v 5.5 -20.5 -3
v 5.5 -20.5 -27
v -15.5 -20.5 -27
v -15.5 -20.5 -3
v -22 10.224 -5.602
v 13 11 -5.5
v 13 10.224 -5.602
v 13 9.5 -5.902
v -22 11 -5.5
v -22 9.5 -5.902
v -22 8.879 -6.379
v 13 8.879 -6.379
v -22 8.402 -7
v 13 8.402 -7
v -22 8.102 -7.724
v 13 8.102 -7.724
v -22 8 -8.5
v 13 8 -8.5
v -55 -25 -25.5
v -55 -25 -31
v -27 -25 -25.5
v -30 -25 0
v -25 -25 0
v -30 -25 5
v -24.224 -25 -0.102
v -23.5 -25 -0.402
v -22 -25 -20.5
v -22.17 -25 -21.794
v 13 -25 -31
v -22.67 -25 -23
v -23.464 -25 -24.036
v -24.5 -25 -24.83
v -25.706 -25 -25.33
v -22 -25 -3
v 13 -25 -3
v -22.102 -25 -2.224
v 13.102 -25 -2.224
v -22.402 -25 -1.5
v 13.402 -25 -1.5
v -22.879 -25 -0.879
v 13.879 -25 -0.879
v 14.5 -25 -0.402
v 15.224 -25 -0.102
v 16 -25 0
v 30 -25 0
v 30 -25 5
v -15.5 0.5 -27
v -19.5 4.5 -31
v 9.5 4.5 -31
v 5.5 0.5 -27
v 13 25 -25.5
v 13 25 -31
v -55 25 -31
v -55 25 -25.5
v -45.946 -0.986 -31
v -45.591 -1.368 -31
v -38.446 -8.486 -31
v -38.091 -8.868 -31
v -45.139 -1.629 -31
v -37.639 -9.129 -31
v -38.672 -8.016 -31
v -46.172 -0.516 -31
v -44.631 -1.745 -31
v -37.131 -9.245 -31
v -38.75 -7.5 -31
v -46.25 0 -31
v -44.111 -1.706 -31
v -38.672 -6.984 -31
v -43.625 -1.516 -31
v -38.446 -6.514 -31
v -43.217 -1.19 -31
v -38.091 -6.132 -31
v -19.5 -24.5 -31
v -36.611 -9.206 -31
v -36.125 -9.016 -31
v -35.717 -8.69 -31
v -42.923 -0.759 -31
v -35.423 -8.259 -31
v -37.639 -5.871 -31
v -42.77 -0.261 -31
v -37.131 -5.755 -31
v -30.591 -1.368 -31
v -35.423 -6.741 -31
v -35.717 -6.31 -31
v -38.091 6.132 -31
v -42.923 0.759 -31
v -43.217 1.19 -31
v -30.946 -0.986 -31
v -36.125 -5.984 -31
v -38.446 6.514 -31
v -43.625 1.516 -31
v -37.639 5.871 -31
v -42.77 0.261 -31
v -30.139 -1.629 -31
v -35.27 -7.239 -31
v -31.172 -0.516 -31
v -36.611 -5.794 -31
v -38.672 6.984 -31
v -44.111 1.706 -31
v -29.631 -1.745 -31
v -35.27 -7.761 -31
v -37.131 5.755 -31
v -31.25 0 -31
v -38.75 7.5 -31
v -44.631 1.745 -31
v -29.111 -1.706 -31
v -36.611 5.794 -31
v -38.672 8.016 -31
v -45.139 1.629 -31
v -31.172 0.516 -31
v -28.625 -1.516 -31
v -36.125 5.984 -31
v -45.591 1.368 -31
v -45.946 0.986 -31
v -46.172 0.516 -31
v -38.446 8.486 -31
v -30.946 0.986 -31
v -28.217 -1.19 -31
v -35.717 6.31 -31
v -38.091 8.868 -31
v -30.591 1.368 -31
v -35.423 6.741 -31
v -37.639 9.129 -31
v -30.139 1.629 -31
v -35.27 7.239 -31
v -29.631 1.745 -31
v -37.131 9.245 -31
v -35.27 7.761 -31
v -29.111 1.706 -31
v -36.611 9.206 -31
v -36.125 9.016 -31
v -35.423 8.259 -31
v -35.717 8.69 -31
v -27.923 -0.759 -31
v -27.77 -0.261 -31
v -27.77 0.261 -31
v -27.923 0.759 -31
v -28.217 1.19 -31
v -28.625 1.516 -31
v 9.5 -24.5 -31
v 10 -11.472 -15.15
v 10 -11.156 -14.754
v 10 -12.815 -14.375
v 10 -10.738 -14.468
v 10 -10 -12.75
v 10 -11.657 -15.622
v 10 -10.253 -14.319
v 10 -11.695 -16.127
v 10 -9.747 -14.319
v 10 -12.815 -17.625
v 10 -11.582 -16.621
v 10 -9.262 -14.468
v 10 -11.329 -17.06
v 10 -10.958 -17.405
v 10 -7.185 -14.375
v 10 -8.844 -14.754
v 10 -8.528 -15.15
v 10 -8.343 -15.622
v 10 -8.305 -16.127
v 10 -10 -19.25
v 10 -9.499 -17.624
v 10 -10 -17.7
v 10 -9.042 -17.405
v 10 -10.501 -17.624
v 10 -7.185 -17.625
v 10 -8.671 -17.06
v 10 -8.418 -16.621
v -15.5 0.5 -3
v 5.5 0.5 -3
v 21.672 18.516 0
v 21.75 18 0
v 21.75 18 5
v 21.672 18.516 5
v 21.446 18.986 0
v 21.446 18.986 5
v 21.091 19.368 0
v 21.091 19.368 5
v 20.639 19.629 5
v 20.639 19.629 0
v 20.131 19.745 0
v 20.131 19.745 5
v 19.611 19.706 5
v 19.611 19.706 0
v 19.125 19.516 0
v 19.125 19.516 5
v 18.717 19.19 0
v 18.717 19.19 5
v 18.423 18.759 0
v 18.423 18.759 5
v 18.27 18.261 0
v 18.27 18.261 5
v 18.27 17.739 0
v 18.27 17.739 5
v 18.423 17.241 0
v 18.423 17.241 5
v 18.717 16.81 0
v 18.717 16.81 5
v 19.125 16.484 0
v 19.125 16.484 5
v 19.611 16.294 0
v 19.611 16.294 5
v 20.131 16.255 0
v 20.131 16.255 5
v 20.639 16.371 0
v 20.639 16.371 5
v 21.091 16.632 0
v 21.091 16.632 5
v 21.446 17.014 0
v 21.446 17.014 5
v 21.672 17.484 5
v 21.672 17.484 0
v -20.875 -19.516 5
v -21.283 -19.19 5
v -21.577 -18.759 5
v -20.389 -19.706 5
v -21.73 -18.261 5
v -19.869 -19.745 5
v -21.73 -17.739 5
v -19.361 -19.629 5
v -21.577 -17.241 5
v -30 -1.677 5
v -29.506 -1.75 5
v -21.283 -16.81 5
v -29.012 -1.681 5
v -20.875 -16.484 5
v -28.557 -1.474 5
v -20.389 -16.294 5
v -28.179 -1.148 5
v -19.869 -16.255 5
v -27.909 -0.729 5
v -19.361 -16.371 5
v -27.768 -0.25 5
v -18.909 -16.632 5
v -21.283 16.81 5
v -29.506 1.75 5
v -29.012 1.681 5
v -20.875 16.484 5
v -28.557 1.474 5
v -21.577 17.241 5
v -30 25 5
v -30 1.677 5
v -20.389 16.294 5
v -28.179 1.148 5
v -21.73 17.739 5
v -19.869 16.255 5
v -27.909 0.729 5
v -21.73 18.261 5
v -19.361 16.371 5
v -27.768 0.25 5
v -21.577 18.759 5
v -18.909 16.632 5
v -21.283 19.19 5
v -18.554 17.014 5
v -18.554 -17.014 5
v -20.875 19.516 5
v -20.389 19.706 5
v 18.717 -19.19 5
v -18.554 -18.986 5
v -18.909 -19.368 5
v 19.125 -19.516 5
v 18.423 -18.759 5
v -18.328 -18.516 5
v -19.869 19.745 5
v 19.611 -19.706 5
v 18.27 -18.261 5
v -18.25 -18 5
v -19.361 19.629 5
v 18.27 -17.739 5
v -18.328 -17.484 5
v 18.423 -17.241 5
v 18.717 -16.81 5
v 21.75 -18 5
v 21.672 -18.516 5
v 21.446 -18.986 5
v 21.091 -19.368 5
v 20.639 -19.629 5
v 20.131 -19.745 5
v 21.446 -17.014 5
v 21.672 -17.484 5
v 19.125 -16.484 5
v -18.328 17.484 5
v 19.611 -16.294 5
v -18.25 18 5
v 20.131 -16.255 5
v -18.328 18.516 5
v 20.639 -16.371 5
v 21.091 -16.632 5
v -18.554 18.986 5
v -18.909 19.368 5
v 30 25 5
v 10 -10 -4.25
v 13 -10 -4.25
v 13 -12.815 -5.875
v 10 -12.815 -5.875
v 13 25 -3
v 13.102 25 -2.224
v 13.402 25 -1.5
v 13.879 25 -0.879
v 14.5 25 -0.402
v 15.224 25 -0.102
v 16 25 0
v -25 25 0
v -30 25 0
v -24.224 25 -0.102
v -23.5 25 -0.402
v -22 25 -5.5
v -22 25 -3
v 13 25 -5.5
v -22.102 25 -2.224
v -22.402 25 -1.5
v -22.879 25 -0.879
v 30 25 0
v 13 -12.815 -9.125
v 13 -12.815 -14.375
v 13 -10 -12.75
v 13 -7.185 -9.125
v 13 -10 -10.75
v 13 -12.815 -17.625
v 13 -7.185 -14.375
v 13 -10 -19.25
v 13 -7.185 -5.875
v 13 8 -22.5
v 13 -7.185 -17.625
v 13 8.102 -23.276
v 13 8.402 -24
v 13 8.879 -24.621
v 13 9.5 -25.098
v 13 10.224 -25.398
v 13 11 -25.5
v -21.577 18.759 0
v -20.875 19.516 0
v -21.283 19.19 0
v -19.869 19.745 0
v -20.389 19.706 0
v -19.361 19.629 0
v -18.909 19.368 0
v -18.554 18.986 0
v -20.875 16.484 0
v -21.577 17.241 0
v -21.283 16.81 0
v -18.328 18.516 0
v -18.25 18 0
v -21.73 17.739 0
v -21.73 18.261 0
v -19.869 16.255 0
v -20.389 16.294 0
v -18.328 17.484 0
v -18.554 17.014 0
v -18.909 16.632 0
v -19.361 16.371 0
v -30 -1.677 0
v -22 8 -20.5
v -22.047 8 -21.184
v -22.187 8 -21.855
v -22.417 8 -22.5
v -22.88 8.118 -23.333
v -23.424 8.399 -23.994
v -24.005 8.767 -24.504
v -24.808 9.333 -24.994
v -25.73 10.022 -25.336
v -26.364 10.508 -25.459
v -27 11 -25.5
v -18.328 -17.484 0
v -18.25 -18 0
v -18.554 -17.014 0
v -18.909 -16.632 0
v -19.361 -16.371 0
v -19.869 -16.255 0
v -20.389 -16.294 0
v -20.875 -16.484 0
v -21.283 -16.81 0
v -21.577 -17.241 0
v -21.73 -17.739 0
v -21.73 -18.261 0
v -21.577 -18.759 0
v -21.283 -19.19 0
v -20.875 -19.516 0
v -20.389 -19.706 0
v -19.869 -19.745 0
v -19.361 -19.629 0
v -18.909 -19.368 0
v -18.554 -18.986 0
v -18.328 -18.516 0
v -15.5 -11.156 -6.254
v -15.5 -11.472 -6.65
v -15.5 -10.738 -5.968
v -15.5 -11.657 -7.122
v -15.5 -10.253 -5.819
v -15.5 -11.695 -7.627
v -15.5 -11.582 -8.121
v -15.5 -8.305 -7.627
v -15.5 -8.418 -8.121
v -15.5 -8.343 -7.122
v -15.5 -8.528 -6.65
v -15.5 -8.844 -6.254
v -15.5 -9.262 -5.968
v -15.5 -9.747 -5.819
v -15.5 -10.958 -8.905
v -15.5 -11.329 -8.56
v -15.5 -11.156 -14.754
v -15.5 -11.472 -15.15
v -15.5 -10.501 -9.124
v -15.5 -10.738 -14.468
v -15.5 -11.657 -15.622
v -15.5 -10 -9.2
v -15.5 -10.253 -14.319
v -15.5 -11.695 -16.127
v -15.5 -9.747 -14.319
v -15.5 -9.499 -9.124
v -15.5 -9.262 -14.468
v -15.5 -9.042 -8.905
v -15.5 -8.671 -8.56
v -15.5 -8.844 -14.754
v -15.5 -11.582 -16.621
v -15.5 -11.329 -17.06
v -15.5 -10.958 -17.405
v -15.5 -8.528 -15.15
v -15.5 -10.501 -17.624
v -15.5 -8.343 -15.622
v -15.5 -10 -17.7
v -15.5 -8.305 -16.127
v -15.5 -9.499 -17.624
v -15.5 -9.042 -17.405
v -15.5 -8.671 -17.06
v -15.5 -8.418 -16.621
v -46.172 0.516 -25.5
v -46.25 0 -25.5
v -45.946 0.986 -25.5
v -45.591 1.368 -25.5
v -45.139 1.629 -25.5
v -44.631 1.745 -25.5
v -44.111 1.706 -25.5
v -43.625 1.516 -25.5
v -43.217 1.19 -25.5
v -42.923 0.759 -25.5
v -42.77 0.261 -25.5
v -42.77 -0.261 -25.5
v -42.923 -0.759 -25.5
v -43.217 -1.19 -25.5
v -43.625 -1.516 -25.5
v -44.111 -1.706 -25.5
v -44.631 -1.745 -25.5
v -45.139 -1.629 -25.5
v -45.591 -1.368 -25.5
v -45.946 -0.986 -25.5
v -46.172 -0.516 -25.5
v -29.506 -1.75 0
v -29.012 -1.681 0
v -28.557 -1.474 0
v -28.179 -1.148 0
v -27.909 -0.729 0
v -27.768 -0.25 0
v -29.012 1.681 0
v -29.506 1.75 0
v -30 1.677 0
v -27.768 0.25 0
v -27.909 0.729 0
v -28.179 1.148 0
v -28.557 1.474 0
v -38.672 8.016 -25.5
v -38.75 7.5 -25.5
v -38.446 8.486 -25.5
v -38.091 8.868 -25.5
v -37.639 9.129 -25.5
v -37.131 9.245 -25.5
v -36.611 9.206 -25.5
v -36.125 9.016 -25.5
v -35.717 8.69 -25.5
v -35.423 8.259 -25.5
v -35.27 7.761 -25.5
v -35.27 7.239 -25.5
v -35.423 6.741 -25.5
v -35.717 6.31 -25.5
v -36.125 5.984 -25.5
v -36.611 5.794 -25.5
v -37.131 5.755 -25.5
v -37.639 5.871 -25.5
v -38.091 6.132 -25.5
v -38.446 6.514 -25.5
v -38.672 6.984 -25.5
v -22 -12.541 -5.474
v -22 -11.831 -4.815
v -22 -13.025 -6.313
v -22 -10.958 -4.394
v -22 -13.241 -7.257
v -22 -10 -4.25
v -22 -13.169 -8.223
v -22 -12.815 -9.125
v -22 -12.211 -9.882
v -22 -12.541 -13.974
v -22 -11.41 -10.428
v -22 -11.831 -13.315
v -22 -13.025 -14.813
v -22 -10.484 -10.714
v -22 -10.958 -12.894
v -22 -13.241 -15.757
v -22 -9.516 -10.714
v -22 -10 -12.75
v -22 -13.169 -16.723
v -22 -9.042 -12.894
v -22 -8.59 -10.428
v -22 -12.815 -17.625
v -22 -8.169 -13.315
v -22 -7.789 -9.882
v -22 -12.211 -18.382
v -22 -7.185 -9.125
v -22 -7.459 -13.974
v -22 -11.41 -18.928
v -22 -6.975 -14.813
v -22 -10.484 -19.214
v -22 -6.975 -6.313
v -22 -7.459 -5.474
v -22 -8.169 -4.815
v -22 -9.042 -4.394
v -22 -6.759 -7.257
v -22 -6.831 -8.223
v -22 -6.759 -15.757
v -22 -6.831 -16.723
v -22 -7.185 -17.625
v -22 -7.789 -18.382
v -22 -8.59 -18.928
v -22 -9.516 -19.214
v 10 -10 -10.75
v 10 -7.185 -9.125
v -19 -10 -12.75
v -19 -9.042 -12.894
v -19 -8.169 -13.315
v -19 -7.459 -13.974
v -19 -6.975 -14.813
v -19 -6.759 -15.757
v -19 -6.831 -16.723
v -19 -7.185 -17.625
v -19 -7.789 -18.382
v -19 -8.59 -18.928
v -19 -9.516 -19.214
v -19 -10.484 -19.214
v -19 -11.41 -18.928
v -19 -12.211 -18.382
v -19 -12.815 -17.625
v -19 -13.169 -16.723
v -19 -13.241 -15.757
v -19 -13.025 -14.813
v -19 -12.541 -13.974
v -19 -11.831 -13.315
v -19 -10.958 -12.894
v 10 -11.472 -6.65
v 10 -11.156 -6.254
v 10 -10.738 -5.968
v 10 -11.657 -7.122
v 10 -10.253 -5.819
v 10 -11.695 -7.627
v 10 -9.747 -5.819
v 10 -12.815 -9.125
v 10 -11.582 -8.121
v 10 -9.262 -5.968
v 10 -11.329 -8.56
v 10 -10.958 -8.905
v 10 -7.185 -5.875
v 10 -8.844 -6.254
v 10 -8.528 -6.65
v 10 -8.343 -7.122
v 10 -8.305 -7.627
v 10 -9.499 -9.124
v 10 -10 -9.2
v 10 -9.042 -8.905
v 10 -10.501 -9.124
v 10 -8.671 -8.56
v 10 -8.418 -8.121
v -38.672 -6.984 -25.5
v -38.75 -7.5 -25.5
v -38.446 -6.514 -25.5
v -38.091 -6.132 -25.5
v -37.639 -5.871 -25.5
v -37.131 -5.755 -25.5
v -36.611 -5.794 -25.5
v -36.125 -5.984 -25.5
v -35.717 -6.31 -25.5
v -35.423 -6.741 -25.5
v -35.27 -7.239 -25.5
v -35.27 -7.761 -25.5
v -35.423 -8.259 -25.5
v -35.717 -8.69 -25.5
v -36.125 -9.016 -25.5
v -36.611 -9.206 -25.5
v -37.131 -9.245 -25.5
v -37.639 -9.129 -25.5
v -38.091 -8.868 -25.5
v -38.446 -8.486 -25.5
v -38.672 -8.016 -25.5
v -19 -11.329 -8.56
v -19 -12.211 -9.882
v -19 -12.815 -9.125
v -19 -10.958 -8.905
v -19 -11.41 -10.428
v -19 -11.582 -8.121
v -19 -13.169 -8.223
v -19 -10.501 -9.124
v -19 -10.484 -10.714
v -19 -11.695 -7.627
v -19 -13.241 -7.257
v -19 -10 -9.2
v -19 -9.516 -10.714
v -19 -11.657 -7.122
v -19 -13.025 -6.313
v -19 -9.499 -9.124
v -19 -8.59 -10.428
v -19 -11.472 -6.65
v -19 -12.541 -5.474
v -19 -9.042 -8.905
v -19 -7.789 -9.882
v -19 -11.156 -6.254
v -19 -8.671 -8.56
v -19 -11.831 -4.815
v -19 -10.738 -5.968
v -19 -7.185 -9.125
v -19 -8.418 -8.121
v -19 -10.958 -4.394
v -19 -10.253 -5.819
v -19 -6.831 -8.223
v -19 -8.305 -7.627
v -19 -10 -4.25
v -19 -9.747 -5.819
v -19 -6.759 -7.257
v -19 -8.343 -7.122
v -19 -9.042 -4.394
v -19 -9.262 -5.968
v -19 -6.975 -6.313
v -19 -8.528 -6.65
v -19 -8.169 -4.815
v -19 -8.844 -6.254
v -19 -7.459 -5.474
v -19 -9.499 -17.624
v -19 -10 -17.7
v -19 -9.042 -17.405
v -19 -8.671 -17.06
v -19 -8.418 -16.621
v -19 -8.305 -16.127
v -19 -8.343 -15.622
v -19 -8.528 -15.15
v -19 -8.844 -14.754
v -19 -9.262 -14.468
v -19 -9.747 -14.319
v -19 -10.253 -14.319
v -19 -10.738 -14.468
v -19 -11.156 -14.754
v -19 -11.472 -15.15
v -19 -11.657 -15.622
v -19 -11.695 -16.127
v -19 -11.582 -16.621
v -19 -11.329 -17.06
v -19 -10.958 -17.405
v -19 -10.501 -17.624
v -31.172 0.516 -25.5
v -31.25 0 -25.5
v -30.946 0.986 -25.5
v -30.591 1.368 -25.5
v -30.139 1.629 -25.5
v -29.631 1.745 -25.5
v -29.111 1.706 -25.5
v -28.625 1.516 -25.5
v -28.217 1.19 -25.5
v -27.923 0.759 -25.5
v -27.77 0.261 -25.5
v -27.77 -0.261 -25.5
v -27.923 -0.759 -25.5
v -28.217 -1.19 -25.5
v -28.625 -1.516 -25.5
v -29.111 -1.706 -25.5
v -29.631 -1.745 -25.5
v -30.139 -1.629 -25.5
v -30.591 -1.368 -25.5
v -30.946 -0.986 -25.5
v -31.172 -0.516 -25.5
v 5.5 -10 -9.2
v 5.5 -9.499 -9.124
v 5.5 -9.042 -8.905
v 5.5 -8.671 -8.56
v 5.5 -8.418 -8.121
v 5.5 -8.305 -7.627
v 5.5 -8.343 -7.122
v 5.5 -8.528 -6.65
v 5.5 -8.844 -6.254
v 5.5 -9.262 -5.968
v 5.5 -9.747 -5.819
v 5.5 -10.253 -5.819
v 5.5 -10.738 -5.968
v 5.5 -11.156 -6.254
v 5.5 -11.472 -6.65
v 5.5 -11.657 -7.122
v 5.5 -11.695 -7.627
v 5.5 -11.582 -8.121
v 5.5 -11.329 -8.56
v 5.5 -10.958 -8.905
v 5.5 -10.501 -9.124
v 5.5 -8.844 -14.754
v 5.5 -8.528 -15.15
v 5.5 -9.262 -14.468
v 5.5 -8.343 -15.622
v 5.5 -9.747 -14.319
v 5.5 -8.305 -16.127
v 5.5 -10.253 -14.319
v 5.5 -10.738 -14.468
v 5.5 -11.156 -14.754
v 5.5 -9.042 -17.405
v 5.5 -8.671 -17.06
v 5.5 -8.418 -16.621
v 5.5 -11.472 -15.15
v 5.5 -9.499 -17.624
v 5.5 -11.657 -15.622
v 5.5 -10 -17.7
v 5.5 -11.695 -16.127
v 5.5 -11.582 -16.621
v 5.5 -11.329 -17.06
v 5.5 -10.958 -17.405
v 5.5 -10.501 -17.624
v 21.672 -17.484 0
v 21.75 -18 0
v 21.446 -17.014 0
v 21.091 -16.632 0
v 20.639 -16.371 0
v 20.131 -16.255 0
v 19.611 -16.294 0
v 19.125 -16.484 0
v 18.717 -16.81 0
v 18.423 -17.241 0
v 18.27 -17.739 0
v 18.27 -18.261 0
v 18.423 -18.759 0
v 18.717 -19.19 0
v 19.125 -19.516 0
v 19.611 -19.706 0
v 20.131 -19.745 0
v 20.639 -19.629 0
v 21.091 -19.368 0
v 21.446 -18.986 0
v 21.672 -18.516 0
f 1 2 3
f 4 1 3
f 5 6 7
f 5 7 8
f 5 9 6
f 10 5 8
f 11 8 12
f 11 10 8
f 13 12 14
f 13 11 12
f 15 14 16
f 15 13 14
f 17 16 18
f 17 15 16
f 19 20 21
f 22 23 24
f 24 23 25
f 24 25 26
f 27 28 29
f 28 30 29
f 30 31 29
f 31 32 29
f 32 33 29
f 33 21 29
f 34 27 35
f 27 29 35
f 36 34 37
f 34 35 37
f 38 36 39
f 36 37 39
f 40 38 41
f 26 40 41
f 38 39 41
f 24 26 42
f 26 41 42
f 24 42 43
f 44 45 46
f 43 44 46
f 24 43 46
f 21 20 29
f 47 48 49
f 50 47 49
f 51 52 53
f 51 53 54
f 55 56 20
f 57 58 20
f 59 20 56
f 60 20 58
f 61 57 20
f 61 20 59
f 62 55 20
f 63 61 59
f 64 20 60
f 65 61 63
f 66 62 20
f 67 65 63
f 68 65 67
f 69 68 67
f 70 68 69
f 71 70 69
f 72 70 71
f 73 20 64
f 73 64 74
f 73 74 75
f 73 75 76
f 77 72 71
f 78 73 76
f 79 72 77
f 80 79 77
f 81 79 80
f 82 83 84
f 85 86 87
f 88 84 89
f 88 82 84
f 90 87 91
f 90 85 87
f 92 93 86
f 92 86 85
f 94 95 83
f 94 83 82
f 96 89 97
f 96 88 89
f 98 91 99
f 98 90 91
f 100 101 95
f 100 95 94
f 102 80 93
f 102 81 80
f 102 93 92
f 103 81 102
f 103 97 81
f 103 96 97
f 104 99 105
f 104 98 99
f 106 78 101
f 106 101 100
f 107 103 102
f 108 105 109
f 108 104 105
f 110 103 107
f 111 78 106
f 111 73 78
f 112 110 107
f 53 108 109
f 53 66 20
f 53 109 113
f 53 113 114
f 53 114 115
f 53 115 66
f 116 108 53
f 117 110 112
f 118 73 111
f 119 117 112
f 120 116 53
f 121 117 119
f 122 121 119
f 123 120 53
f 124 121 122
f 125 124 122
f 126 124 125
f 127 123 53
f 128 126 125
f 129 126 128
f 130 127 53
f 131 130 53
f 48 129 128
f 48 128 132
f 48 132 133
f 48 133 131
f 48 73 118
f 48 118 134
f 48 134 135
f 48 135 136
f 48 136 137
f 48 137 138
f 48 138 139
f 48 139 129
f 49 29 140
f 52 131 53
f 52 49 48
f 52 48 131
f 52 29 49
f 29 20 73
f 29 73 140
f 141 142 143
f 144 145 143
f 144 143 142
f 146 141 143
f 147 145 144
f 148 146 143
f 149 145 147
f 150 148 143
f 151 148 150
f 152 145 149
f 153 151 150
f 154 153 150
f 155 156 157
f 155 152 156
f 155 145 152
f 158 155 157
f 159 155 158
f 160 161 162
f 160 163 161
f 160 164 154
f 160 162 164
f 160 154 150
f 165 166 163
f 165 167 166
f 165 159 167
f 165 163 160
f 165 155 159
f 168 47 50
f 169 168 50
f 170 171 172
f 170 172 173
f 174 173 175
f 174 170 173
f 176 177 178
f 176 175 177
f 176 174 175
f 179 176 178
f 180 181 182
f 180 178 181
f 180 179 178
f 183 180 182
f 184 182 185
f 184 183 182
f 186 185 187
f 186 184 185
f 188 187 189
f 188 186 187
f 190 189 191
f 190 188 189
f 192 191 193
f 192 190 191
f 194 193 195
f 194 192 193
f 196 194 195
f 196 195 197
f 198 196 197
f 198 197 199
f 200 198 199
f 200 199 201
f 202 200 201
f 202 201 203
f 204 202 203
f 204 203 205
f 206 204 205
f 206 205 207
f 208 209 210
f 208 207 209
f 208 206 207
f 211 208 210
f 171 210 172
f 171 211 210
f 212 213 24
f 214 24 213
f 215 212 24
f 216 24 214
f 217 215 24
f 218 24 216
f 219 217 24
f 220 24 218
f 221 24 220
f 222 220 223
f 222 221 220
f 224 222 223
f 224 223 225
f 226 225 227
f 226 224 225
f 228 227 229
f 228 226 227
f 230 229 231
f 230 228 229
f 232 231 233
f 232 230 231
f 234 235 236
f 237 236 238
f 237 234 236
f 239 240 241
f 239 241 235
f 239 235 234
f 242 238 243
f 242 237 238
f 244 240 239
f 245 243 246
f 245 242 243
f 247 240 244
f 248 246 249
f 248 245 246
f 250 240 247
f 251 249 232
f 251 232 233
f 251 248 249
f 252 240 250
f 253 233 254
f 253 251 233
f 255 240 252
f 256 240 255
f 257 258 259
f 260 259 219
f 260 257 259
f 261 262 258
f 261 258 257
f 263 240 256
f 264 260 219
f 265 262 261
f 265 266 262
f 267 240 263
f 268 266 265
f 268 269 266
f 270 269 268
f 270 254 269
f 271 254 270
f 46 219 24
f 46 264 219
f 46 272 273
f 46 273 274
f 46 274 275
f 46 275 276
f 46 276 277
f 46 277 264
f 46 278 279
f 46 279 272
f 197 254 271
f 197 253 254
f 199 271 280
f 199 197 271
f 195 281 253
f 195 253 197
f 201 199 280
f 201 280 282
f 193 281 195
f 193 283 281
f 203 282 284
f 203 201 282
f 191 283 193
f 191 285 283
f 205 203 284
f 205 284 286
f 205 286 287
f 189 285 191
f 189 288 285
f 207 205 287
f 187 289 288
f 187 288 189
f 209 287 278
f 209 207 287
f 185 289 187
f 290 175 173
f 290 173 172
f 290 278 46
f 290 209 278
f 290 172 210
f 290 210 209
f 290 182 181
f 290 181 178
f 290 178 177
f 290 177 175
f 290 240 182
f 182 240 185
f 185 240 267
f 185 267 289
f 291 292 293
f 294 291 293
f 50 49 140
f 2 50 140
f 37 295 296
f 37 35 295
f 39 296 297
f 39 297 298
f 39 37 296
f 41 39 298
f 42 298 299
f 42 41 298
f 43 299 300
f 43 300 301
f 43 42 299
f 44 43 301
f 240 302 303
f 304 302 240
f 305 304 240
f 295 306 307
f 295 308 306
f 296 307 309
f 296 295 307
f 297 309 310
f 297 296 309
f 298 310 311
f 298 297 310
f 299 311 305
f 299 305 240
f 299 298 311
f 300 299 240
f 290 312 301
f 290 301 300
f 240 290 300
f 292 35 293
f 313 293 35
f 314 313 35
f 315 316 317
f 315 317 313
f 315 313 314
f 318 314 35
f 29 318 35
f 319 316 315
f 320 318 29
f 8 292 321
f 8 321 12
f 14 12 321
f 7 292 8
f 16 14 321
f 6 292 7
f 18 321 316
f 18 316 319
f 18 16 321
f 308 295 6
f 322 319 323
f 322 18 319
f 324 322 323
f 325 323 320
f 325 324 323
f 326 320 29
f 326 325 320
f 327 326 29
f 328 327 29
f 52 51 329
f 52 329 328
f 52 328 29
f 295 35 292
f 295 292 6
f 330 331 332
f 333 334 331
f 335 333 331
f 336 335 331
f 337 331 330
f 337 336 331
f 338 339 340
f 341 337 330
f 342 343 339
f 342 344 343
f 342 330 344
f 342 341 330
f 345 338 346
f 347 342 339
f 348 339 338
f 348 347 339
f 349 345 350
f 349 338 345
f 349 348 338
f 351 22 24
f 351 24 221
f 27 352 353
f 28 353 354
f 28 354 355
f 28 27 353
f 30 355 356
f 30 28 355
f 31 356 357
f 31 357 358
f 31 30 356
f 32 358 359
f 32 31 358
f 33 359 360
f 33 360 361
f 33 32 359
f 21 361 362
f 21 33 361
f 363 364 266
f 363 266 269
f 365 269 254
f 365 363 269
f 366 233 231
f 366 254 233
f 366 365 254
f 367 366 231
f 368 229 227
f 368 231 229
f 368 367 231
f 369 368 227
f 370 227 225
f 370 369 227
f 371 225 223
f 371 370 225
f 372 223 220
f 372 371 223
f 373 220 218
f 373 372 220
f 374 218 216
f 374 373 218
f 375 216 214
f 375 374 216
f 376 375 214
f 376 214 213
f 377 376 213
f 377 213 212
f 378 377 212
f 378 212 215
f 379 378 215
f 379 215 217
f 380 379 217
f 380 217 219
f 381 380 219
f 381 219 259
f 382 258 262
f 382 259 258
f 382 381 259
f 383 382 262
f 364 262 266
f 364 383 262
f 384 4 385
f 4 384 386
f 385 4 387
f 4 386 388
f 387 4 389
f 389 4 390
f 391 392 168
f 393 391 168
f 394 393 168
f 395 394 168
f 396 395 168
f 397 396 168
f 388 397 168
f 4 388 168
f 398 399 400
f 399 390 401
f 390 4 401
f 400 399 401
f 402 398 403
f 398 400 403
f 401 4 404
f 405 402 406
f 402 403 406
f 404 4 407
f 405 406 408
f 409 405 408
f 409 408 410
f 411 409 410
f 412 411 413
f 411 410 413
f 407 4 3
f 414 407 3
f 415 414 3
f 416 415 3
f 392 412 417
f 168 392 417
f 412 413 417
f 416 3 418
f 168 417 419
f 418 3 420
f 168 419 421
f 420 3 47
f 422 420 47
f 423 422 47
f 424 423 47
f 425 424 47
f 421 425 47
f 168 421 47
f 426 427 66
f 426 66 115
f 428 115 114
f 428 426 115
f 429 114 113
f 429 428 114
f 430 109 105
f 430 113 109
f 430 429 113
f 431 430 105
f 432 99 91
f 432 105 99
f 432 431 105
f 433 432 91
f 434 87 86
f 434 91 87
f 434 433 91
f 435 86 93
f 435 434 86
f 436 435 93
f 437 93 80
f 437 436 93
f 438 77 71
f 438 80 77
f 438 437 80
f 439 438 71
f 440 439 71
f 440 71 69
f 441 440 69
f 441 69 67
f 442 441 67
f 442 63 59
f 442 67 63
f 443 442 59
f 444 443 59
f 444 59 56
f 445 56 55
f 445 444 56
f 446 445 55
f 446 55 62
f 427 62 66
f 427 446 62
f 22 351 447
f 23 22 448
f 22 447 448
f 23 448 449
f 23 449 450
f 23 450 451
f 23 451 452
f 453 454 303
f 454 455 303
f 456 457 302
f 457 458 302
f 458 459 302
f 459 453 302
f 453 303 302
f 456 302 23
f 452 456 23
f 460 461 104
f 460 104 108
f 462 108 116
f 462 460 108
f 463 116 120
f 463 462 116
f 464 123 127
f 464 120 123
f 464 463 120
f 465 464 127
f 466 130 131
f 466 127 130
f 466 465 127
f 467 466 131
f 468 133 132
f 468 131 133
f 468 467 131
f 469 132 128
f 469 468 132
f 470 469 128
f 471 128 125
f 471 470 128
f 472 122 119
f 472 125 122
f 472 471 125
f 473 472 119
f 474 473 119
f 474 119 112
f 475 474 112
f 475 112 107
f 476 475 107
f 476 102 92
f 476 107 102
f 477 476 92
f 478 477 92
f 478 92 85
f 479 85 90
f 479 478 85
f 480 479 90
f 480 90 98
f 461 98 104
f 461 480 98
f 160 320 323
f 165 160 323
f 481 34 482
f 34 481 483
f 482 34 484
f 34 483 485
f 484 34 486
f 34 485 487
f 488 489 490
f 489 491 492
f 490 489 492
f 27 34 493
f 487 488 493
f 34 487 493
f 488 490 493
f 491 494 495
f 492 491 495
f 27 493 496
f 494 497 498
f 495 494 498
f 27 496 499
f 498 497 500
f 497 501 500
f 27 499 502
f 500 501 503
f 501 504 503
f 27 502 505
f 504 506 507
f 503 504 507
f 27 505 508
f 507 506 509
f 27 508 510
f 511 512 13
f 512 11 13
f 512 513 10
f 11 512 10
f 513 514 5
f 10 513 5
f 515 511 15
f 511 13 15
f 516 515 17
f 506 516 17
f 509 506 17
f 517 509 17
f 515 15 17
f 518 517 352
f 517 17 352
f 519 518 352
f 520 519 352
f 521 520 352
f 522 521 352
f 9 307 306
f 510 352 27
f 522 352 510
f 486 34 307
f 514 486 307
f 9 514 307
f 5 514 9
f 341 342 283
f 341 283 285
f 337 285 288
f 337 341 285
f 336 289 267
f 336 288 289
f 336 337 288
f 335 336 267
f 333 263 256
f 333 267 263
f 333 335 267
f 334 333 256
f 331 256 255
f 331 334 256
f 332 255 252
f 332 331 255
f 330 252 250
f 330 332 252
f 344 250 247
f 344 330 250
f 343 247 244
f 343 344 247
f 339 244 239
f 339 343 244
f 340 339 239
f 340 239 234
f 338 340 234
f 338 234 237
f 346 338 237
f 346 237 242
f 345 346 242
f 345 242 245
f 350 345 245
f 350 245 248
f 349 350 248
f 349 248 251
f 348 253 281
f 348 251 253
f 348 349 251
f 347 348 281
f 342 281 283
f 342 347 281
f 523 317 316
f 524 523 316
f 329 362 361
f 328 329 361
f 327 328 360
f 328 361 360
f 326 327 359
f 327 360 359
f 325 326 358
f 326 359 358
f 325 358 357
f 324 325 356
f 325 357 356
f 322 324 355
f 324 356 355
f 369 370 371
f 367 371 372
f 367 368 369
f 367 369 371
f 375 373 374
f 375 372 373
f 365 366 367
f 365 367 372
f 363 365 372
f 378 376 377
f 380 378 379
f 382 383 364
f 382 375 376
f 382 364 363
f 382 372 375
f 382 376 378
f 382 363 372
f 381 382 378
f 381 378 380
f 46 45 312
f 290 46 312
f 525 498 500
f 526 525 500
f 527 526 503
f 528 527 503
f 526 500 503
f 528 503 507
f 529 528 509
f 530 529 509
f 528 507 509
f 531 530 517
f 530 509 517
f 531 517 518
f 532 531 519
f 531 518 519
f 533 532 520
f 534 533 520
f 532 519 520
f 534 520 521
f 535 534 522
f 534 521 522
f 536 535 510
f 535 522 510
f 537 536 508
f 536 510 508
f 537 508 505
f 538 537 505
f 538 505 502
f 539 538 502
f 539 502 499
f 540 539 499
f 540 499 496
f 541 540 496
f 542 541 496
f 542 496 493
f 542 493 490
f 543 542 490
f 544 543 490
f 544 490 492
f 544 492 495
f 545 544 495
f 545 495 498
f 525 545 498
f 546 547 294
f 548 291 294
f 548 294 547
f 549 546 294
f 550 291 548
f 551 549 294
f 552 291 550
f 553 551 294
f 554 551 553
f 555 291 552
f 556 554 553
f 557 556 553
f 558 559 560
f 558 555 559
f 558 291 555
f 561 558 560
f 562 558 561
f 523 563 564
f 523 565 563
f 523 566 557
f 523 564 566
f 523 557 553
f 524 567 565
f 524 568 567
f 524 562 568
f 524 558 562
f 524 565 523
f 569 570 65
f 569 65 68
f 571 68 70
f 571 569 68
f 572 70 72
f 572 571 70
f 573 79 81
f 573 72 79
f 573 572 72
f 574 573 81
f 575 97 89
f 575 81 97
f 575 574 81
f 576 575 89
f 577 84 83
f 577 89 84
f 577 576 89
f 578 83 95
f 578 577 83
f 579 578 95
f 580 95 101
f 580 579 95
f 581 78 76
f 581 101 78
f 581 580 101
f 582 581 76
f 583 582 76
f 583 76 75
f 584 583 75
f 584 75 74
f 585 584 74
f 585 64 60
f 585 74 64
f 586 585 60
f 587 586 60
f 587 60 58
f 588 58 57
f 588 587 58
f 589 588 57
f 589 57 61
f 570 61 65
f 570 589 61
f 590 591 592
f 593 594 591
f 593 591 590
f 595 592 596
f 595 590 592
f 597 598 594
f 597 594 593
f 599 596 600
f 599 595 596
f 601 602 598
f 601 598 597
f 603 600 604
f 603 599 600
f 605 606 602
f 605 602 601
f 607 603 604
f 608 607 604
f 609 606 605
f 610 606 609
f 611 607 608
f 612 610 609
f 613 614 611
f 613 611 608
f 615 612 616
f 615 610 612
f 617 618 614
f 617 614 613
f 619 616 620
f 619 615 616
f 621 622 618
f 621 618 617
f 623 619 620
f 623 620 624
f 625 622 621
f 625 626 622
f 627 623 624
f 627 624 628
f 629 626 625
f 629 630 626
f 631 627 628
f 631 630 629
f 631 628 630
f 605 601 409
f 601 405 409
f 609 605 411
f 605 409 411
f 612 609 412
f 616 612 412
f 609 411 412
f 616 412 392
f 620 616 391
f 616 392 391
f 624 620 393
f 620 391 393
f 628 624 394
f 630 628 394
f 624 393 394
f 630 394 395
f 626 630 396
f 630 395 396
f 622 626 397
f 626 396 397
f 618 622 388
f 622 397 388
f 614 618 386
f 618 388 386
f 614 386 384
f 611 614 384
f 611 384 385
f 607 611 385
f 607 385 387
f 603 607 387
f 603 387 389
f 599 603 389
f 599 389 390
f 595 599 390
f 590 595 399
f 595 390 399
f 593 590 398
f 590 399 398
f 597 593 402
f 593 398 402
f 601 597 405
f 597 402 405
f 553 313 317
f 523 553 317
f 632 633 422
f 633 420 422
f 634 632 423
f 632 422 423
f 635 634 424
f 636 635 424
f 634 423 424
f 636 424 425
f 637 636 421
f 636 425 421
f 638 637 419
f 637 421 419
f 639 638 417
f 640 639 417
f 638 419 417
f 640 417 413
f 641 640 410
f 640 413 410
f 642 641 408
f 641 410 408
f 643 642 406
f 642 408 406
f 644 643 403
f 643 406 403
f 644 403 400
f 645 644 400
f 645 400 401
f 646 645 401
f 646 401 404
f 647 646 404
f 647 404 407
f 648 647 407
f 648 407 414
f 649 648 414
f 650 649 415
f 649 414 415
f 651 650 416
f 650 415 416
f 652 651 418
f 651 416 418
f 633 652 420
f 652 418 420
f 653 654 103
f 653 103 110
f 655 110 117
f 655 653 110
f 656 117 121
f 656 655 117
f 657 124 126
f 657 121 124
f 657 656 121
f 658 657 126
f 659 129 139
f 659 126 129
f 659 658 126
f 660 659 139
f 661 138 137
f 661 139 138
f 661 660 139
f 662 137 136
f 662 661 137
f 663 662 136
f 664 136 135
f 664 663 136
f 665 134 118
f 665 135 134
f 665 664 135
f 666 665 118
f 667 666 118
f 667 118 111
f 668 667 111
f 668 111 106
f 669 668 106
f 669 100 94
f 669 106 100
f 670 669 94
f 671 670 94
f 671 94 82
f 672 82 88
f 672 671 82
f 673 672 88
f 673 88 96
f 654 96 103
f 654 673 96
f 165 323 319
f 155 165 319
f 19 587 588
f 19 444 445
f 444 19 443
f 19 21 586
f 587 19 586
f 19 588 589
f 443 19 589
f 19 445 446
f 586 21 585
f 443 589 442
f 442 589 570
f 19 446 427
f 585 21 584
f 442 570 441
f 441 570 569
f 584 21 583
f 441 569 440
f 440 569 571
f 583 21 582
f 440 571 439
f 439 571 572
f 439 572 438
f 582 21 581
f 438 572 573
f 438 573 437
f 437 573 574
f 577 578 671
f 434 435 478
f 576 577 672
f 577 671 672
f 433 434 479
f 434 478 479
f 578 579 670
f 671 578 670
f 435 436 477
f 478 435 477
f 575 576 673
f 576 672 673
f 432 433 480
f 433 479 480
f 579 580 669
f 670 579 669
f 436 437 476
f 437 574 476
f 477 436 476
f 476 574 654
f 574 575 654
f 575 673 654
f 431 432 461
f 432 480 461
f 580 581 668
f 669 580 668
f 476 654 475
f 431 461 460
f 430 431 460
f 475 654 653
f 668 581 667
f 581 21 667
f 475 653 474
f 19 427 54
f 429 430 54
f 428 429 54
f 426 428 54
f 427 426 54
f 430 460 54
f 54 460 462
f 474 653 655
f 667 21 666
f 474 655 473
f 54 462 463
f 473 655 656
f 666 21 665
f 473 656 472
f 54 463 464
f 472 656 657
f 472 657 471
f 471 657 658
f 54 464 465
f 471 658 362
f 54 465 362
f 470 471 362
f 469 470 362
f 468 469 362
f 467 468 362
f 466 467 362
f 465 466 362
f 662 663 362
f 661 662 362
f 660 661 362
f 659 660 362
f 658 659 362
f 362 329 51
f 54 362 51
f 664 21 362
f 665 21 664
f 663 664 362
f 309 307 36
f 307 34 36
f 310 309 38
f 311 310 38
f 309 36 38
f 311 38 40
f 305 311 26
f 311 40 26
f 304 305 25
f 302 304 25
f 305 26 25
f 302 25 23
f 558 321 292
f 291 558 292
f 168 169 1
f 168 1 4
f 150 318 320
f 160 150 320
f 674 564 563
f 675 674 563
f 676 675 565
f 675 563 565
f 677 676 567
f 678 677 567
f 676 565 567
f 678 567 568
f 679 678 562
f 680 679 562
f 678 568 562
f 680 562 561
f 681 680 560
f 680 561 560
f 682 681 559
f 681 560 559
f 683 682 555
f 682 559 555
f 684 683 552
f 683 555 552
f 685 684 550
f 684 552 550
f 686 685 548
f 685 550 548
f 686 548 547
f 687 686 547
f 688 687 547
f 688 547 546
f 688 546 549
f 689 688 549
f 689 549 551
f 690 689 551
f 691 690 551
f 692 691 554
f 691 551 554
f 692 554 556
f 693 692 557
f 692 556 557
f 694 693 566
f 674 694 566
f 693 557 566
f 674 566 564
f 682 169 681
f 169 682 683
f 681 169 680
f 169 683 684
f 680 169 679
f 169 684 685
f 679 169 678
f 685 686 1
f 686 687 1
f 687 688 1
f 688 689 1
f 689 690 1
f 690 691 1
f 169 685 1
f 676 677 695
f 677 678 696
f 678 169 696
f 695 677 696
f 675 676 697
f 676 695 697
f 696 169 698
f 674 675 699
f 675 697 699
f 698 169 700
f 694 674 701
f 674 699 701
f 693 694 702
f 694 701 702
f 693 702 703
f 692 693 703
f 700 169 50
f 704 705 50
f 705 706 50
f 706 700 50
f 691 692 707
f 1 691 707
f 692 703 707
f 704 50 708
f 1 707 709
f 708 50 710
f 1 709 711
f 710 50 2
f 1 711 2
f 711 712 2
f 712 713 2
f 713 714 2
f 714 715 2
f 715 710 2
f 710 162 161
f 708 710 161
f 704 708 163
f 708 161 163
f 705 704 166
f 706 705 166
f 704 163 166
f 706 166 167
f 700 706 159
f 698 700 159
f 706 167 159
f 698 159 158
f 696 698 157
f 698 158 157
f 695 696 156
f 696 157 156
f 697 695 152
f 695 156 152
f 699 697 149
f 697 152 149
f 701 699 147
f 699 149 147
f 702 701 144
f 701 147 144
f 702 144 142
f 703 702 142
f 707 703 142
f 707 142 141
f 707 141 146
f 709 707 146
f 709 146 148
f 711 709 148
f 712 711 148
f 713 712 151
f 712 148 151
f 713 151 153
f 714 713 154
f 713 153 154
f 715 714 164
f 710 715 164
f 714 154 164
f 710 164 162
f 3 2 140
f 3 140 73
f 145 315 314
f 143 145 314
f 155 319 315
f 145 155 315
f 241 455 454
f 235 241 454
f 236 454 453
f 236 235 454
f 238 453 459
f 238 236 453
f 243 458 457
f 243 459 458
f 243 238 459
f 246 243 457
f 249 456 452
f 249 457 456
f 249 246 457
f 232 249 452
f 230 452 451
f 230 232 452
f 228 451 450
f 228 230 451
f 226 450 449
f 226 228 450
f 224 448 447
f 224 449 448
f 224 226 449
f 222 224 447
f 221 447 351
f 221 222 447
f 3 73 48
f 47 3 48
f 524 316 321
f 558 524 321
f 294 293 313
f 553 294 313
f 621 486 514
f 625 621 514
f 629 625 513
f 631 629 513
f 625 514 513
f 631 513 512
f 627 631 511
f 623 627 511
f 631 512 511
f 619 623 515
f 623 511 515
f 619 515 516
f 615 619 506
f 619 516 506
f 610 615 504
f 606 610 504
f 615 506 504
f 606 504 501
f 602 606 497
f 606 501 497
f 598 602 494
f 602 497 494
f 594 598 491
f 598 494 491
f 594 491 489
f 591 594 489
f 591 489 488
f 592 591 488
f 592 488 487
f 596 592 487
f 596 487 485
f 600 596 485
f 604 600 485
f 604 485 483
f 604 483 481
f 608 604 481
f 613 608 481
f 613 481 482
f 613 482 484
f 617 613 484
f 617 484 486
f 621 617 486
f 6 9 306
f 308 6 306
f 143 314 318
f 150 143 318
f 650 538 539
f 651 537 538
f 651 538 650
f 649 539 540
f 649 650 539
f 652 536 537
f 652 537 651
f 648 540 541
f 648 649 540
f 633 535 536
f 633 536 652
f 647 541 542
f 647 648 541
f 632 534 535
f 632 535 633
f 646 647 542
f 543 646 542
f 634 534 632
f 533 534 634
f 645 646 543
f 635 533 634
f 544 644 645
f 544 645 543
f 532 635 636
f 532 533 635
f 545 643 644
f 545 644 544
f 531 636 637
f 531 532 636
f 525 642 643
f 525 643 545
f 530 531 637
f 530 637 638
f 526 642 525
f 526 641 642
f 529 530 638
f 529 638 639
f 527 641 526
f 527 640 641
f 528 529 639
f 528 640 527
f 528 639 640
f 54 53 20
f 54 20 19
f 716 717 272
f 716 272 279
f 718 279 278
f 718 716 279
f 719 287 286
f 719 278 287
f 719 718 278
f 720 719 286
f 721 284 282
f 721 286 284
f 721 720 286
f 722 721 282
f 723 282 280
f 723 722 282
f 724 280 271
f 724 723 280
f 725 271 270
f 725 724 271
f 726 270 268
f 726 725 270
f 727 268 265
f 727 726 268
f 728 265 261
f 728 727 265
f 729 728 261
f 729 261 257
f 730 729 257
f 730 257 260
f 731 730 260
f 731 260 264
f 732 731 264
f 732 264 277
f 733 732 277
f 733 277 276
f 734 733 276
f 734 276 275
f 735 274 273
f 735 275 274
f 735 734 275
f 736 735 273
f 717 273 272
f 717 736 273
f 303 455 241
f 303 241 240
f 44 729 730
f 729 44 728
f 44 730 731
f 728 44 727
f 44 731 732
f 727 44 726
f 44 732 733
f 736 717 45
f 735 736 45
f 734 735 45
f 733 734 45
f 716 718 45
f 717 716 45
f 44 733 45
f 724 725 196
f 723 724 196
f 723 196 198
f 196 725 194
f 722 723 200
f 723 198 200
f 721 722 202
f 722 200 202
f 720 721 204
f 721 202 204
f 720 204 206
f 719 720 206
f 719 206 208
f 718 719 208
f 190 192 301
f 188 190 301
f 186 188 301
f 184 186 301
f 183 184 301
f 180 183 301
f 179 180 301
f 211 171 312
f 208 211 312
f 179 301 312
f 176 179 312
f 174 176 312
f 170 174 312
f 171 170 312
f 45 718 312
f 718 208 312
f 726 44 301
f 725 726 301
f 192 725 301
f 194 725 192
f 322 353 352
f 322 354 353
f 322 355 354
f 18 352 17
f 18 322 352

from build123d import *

# Parameters (mm, degrees)
SKETCH1_W                      = 60
SKETCH1_H                      = 50
BOSS_EXTRUDE1_DEPTH            = 5
CUT_EXTRUDE1_DEPTH             = 40.37003937
CUT_EXTRUDE1_DEPTH_BACK        = 40.37003937
SKETCH5_R                      = 1.75
BOSS_EXTRUDE2_START            = -17
BOSS_EXTRUDE2_DEPTH            = 35
SKETCH6_W                      = 5.5
SKETCH6_H                      = 50
BOSS_EXTRUDE3_DEPTH            = 33
CUT_EXTRUDE2_DEPTH             = 71.32780389
CUT_EXTRUDE2_DEPTH_BACK        = 71.32780389
SKETCH7_R                      = 1.75
FILLET2_R                      = 3
FILLET3_R                      = 3
SKETCH8_W                      = 21
SKETCH8_H                      = 21
CUT_EXTRUDE3_DEPTH             = 28
FILLET4_R                      = 5
CBORE_FOR_M3_SHCS1_D           = 3.4
CBORE_FOR_M3_SHCS1_CBORE_D     = 6.5
CBORE_FOR_M3_SHCS1_CBORE_DEPTH = 3
SKETCH16_R                     = 1.7
CUT_EXTRUDE4_DEPTH             = 3
CHAMFER1_SIZE                  = 4


with BuildPart() as part:
    # Sketch1 → Boss-Extrude1 (new body)
    with BuildSketch(Plane.XY):
        Rectangle(SKETCH1_W, SKETCH1_H)
    extrude(amount=BOSS_EXTRUDE1_DEPTH)

    # Sketch5 → Cut-Extrude1 (cut, two sides: drawn at the far end of the back side and taken through both)
    with BuildSketch(Plane.XY.offset(5).offset(-CUT_EXTRUDE1_DEPTH_BACK)):
        with Locations((-20, 18)):
            Circle(SKETCH5_R)
        with Locations((20, 18)):
            Circle(SKETCH5_R)
        with Locations((20, -18)):
            Circle(SKETCH5_R)
        with Locations((-20, -18)):
            Circle(SKETCH5_R)
    extrude(amount=CUT_EXTRUDE1_DEPTH + CUT_EXTRUDE1_DEPTH_BACK, mode=Mode.SUBTRACT)

    # Sketch2 → Boss-Extrude2 (add)
    with BuildSketch(Plane(origin=(30, 0, 0), x_dir=(0, 0, -1), z_dir=(1, 0, 0)).offset(BOSS_EXTRUDE2_START)):
        Polygon((0, -25), (31, -25), (31, 25), (25.5, 25), (25.5, 8), (5.5, 8), (5.5, 25), (0, 25), align=None)
    extrude(amount=-BOSS_EXTRUDE2_DEPTH)

    # Sketch6 → Boss-Extrude3 (add)
    with BuildSketch(Plane.ZY.offset(22)):
        with Locations((-28.25, 0)):
            Rectangle(SKETCH6_W, SKETCH6_H)
    extrude(amount=BOSS_EXTRUDE3_DEPTH)

    # Sketch7 → Cut-Extrude2 (cut, two sides: drawn at the far end of the back side and taken through both)
    with BuildSketch(Plane(origin=(0, 0, -31), x_dir=(-1, 0, 0), z_dir=(0, 0, -1)).offset(-CUT_EXTRUDE2_DEPTH_BACK)):
        with Locations((37, 7.5)):
            Circle(SKETCH7_R)
        with Locations((44.5, 0)):
            Circle(SKETCH7_R)
        with Locations((37, -7.5)):
            Circle(SKETCH7_R)
        with Locations((29.5, 0)):
            Circle(SKETCH7_R)
    extrude(amount=CUT_EXTRUDE2_DEPTH + CUT_EXTRUDE2_DEPTH_BACK, mode=Mode.SUBTRACT)

    # Fillet2
    fillet2_edges = [part.edges().sort_by_distance(p)[0] for p in [
        (13, 0, 0),
        (-22, 0, 0),
    ]]
    fillet(fillet2_edges, radius=FILLET2_R)

    # Fillet3
    fillet3_edges = [part.edges().sort_by_distance(p)[0] for p in [
        (-4.5, 8, -25.5),
        (-4.5, 8, -5.5),
    ]]
    fillet(fillet3_edges, radius=FILLET3_R)

    # Sketch8 → Cut-Extrude3 (cut)
    with BuildSketch(Plane(origin=(0, 0, -31), x_dir=(-1, 0, 0), z_dir=(0, 0, -1))):
        with Locations((5, -10)):
            Rectangle(SKETCH8_W, SKETCH8_H)
    extrude(amount=-CUT_EXTRUDE3_DEPTH, mode=Mode.SUBTRACT)

    # Fillet4
    fillet4_edges = [part.edges().sort_by_distance(p)[0] for p in [
        (-22, -7, -25.5),
    ]]
    fillet(fillet4_edges, radius=FILLET4_R)

    # CBORE for M3 SHCS1 (through all)
    with Locations(Plane.ZY.offset(22)):
        with Locations((-7.5, -10), (-16, -10)):
            CounterBoreHole(CBORE_FOR_M3_SHCS1_D / 2, CBORE_FOR_M3_SHCS1_CBORE_D / 2, CBORE_FOR_M3_SHCS1_CBORE_DEPTH)

    # Sketch16 → Cut-Extrude4 (cut)
    # profile 1 of 2: a face of its own
    with BuildSketch(Plane(origin=(13, 0, 0), x_dir=(0, 0, -1), z_dir=(1, 0, 0))):
        Polygon((9.125, -12.814582562), (10.75, -10), (9.125, -7.185417438), (5.875, -7.185417438), (4.25, -10), (5.875, -12.814582562), align=None)
        with Locations((7.5, -10)):
            Circle(SKETCH16_R, mode=Mode.SUBTRACT)
    # profile 2 of 2: a face of its own
    with BuildSketch(Plane(origin=(13, 0, 0), x_dir=(0, 0, -1), z_dir=(1, 0, 0))):
        Polygon((17.625, -12.814582562), (19.25, -10), (17.625, -7.185417438), (14.375, -7.185417438), (12.75, -10), (14.375, -12.814582562), align=None)
        with Locations((16, -10)):
            Circle(SKETCH16_R, mode=Mode.SUBTRACT)
    extrude(amount=-CUT_EXTRUDE4_DEPTH, mode=Mode.SUBTRACT)

    # Chamfer1
    chamfer1_edges = [part.edges().sort_by_distance(p)[0] for p in [
        (5.5, -10, -31),
        (-5, -20.5, -31),
        (-5, 0.5, -31),
        (-15.5, -10, -31),
    ]]
    chamfer(chamfer1_edges, length=CHAMFER1_SIZE)


solid = part.part
